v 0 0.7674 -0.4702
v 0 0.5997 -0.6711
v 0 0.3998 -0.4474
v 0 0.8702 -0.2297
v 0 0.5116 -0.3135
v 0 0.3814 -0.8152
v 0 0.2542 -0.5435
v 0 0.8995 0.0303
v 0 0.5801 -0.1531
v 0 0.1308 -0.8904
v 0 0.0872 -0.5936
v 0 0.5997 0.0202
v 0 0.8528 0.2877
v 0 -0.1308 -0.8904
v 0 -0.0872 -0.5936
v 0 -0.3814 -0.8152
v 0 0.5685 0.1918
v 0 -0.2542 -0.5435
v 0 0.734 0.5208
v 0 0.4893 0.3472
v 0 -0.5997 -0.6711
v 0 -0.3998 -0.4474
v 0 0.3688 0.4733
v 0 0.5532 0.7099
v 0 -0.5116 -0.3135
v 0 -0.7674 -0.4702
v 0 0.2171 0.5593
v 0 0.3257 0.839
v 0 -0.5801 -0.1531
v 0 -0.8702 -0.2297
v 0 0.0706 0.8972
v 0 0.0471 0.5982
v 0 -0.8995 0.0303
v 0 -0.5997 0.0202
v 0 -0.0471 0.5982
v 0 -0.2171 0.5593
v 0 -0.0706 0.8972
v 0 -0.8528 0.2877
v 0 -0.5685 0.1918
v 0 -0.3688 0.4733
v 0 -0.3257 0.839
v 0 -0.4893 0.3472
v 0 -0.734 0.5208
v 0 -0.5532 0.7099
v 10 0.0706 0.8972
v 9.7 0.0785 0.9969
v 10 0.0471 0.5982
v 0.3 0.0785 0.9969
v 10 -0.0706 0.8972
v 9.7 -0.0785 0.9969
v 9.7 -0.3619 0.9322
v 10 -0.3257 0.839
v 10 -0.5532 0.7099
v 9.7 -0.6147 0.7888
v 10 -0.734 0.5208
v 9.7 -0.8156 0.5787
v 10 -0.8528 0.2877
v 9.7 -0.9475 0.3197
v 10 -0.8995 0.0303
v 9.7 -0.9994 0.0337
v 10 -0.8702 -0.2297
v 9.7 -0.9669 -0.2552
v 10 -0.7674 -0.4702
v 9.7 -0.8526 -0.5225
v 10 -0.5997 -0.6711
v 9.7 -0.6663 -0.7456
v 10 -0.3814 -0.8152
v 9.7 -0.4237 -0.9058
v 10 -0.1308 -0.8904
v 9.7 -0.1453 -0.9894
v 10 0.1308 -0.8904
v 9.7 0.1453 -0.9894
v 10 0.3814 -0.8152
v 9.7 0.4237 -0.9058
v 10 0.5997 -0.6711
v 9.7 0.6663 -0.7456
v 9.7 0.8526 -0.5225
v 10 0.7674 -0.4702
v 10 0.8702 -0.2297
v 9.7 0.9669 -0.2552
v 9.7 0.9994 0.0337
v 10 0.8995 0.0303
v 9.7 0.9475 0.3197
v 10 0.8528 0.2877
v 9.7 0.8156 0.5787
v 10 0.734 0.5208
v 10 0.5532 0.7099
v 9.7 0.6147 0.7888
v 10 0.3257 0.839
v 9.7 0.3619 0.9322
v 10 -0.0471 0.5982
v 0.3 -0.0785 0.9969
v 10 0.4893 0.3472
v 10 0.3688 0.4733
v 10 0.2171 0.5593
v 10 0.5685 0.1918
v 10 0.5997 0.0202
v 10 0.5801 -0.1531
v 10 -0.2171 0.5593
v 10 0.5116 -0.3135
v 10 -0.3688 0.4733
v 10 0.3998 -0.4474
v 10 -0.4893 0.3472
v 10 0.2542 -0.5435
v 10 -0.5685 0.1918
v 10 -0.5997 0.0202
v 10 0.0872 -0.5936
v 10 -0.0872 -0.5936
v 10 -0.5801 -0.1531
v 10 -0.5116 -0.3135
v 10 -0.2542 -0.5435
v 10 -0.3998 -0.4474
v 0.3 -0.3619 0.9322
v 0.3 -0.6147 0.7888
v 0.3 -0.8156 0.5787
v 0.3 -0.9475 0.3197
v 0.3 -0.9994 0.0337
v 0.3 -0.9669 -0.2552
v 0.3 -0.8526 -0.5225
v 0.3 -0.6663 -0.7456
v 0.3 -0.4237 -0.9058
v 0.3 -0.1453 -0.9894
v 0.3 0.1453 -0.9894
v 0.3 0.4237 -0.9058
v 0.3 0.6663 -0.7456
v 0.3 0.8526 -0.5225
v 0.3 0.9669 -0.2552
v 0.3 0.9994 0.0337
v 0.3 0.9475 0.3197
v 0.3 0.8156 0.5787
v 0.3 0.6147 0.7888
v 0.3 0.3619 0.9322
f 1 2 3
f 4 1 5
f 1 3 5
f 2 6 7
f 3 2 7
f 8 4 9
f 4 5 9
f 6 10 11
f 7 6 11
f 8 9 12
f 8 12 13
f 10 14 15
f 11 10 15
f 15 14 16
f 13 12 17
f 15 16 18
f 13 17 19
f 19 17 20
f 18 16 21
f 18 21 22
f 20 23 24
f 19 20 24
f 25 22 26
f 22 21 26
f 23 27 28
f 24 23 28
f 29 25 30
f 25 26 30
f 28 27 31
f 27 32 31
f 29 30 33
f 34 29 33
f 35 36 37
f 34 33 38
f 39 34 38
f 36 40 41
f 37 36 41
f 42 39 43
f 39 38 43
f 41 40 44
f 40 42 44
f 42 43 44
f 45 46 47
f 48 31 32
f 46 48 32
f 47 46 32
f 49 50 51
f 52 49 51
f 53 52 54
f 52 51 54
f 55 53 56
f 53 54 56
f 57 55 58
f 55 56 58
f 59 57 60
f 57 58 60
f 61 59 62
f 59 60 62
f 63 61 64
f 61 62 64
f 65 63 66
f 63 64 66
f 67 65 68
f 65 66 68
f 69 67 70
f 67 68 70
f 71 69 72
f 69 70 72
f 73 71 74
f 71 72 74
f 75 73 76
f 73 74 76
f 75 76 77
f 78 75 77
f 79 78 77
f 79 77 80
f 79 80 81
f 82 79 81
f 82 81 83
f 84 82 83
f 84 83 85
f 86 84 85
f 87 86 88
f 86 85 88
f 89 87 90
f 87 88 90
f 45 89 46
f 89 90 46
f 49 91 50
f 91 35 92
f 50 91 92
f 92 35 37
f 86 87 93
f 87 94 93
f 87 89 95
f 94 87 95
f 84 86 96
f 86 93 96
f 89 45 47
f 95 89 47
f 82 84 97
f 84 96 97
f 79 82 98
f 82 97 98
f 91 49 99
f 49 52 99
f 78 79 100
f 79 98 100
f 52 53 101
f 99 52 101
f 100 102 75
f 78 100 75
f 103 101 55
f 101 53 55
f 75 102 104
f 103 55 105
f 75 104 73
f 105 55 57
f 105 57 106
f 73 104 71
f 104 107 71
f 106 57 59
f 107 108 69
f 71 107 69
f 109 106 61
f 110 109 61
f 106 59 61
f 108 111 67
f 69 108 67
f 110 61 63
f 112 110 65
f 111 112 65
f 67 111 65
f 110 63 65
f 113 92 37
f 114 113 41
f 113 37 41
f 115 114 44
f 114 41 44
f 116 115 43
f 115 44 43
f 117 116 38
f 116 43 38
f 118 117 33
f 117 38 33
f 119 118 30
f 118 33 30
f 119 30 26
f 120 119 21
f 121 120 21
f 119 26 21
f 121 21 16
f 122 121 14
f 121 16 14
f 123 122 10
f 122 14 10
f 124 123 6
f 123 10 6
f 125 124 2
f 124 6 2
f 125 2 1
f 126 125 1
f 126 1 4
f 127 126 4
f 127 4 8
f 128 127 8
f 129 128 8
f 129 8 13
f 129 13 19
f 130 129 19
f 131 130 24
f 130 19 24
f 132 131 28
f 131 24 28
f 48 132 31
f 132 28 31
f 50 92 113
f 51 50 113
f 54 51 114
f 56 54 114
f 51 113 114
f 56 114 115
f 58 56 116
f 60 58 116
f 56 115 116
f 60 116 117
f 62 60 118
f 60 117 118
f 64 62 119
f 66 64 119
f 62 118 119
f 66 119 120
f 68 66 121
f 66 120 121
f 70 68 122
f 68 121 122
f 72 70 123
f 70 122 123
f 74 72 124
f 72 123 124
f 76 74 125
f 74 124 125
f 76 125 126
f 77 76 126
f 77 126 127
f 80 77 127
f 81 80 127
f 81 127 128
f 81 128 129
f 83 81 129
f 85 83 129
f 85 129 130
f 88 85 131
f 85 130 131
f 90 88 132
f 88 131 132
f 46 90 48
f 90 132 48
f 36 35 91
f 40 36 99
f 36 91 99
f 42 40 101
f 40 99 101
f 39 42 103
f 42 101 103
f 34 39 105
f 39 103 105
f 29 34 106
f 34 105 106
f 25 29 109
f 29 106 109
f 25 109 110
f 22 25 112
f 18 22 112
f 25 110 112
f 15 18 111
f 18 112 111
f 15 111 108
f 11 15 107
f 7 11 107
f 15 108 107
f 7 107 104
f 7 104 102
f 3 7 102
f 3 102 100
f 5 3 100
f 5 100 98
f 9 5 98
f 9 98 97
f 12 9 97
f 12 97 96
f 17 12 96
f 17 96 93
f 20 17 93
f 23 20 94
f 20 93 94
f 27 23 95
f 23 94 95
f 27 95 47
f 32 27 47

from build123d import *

# Parameters (mm, degrees)
GAP_DEPTH = 11.099504938


with BuildPart() as part:
    # BodySke → Body (revolve)
    with BuildSketch(Plane.XY, mode=Mode.PRIVATE) as body_sk:
        Polygon((0, 0.6), (10, 0.6), (10, 0.9), (9.7, 1), (0.3, 1), (0, 0.9), align=None)
    revolve(body_sk.sketch.rotate(Axis((-9.525, 0, 0), (1, 0, 0)), 90), axis=Axis((-9.525, 0, 0), (1, 0, 0)))

    # GapSke → Gap (cut, through all)
    with BuildSketch(Plane(origin=(0, 0, 0), x_dir=(0, -1, 0), z_dir=(-1, 0, 0))):
        with BuildLine():
            Line((0, 0), (0.080028278, 1.01685568))
            ThreePointArc((0.080028278, 1.01685568), (0, 1.02), (-0.080028278, 1.01685568))
            Line((-0.080028278, 1.01685568), (0, 0))
        make_face()
    extrude(amount=-GAP_DEPTH, mode=Mode.SUBTRACT)


solid = part.part
